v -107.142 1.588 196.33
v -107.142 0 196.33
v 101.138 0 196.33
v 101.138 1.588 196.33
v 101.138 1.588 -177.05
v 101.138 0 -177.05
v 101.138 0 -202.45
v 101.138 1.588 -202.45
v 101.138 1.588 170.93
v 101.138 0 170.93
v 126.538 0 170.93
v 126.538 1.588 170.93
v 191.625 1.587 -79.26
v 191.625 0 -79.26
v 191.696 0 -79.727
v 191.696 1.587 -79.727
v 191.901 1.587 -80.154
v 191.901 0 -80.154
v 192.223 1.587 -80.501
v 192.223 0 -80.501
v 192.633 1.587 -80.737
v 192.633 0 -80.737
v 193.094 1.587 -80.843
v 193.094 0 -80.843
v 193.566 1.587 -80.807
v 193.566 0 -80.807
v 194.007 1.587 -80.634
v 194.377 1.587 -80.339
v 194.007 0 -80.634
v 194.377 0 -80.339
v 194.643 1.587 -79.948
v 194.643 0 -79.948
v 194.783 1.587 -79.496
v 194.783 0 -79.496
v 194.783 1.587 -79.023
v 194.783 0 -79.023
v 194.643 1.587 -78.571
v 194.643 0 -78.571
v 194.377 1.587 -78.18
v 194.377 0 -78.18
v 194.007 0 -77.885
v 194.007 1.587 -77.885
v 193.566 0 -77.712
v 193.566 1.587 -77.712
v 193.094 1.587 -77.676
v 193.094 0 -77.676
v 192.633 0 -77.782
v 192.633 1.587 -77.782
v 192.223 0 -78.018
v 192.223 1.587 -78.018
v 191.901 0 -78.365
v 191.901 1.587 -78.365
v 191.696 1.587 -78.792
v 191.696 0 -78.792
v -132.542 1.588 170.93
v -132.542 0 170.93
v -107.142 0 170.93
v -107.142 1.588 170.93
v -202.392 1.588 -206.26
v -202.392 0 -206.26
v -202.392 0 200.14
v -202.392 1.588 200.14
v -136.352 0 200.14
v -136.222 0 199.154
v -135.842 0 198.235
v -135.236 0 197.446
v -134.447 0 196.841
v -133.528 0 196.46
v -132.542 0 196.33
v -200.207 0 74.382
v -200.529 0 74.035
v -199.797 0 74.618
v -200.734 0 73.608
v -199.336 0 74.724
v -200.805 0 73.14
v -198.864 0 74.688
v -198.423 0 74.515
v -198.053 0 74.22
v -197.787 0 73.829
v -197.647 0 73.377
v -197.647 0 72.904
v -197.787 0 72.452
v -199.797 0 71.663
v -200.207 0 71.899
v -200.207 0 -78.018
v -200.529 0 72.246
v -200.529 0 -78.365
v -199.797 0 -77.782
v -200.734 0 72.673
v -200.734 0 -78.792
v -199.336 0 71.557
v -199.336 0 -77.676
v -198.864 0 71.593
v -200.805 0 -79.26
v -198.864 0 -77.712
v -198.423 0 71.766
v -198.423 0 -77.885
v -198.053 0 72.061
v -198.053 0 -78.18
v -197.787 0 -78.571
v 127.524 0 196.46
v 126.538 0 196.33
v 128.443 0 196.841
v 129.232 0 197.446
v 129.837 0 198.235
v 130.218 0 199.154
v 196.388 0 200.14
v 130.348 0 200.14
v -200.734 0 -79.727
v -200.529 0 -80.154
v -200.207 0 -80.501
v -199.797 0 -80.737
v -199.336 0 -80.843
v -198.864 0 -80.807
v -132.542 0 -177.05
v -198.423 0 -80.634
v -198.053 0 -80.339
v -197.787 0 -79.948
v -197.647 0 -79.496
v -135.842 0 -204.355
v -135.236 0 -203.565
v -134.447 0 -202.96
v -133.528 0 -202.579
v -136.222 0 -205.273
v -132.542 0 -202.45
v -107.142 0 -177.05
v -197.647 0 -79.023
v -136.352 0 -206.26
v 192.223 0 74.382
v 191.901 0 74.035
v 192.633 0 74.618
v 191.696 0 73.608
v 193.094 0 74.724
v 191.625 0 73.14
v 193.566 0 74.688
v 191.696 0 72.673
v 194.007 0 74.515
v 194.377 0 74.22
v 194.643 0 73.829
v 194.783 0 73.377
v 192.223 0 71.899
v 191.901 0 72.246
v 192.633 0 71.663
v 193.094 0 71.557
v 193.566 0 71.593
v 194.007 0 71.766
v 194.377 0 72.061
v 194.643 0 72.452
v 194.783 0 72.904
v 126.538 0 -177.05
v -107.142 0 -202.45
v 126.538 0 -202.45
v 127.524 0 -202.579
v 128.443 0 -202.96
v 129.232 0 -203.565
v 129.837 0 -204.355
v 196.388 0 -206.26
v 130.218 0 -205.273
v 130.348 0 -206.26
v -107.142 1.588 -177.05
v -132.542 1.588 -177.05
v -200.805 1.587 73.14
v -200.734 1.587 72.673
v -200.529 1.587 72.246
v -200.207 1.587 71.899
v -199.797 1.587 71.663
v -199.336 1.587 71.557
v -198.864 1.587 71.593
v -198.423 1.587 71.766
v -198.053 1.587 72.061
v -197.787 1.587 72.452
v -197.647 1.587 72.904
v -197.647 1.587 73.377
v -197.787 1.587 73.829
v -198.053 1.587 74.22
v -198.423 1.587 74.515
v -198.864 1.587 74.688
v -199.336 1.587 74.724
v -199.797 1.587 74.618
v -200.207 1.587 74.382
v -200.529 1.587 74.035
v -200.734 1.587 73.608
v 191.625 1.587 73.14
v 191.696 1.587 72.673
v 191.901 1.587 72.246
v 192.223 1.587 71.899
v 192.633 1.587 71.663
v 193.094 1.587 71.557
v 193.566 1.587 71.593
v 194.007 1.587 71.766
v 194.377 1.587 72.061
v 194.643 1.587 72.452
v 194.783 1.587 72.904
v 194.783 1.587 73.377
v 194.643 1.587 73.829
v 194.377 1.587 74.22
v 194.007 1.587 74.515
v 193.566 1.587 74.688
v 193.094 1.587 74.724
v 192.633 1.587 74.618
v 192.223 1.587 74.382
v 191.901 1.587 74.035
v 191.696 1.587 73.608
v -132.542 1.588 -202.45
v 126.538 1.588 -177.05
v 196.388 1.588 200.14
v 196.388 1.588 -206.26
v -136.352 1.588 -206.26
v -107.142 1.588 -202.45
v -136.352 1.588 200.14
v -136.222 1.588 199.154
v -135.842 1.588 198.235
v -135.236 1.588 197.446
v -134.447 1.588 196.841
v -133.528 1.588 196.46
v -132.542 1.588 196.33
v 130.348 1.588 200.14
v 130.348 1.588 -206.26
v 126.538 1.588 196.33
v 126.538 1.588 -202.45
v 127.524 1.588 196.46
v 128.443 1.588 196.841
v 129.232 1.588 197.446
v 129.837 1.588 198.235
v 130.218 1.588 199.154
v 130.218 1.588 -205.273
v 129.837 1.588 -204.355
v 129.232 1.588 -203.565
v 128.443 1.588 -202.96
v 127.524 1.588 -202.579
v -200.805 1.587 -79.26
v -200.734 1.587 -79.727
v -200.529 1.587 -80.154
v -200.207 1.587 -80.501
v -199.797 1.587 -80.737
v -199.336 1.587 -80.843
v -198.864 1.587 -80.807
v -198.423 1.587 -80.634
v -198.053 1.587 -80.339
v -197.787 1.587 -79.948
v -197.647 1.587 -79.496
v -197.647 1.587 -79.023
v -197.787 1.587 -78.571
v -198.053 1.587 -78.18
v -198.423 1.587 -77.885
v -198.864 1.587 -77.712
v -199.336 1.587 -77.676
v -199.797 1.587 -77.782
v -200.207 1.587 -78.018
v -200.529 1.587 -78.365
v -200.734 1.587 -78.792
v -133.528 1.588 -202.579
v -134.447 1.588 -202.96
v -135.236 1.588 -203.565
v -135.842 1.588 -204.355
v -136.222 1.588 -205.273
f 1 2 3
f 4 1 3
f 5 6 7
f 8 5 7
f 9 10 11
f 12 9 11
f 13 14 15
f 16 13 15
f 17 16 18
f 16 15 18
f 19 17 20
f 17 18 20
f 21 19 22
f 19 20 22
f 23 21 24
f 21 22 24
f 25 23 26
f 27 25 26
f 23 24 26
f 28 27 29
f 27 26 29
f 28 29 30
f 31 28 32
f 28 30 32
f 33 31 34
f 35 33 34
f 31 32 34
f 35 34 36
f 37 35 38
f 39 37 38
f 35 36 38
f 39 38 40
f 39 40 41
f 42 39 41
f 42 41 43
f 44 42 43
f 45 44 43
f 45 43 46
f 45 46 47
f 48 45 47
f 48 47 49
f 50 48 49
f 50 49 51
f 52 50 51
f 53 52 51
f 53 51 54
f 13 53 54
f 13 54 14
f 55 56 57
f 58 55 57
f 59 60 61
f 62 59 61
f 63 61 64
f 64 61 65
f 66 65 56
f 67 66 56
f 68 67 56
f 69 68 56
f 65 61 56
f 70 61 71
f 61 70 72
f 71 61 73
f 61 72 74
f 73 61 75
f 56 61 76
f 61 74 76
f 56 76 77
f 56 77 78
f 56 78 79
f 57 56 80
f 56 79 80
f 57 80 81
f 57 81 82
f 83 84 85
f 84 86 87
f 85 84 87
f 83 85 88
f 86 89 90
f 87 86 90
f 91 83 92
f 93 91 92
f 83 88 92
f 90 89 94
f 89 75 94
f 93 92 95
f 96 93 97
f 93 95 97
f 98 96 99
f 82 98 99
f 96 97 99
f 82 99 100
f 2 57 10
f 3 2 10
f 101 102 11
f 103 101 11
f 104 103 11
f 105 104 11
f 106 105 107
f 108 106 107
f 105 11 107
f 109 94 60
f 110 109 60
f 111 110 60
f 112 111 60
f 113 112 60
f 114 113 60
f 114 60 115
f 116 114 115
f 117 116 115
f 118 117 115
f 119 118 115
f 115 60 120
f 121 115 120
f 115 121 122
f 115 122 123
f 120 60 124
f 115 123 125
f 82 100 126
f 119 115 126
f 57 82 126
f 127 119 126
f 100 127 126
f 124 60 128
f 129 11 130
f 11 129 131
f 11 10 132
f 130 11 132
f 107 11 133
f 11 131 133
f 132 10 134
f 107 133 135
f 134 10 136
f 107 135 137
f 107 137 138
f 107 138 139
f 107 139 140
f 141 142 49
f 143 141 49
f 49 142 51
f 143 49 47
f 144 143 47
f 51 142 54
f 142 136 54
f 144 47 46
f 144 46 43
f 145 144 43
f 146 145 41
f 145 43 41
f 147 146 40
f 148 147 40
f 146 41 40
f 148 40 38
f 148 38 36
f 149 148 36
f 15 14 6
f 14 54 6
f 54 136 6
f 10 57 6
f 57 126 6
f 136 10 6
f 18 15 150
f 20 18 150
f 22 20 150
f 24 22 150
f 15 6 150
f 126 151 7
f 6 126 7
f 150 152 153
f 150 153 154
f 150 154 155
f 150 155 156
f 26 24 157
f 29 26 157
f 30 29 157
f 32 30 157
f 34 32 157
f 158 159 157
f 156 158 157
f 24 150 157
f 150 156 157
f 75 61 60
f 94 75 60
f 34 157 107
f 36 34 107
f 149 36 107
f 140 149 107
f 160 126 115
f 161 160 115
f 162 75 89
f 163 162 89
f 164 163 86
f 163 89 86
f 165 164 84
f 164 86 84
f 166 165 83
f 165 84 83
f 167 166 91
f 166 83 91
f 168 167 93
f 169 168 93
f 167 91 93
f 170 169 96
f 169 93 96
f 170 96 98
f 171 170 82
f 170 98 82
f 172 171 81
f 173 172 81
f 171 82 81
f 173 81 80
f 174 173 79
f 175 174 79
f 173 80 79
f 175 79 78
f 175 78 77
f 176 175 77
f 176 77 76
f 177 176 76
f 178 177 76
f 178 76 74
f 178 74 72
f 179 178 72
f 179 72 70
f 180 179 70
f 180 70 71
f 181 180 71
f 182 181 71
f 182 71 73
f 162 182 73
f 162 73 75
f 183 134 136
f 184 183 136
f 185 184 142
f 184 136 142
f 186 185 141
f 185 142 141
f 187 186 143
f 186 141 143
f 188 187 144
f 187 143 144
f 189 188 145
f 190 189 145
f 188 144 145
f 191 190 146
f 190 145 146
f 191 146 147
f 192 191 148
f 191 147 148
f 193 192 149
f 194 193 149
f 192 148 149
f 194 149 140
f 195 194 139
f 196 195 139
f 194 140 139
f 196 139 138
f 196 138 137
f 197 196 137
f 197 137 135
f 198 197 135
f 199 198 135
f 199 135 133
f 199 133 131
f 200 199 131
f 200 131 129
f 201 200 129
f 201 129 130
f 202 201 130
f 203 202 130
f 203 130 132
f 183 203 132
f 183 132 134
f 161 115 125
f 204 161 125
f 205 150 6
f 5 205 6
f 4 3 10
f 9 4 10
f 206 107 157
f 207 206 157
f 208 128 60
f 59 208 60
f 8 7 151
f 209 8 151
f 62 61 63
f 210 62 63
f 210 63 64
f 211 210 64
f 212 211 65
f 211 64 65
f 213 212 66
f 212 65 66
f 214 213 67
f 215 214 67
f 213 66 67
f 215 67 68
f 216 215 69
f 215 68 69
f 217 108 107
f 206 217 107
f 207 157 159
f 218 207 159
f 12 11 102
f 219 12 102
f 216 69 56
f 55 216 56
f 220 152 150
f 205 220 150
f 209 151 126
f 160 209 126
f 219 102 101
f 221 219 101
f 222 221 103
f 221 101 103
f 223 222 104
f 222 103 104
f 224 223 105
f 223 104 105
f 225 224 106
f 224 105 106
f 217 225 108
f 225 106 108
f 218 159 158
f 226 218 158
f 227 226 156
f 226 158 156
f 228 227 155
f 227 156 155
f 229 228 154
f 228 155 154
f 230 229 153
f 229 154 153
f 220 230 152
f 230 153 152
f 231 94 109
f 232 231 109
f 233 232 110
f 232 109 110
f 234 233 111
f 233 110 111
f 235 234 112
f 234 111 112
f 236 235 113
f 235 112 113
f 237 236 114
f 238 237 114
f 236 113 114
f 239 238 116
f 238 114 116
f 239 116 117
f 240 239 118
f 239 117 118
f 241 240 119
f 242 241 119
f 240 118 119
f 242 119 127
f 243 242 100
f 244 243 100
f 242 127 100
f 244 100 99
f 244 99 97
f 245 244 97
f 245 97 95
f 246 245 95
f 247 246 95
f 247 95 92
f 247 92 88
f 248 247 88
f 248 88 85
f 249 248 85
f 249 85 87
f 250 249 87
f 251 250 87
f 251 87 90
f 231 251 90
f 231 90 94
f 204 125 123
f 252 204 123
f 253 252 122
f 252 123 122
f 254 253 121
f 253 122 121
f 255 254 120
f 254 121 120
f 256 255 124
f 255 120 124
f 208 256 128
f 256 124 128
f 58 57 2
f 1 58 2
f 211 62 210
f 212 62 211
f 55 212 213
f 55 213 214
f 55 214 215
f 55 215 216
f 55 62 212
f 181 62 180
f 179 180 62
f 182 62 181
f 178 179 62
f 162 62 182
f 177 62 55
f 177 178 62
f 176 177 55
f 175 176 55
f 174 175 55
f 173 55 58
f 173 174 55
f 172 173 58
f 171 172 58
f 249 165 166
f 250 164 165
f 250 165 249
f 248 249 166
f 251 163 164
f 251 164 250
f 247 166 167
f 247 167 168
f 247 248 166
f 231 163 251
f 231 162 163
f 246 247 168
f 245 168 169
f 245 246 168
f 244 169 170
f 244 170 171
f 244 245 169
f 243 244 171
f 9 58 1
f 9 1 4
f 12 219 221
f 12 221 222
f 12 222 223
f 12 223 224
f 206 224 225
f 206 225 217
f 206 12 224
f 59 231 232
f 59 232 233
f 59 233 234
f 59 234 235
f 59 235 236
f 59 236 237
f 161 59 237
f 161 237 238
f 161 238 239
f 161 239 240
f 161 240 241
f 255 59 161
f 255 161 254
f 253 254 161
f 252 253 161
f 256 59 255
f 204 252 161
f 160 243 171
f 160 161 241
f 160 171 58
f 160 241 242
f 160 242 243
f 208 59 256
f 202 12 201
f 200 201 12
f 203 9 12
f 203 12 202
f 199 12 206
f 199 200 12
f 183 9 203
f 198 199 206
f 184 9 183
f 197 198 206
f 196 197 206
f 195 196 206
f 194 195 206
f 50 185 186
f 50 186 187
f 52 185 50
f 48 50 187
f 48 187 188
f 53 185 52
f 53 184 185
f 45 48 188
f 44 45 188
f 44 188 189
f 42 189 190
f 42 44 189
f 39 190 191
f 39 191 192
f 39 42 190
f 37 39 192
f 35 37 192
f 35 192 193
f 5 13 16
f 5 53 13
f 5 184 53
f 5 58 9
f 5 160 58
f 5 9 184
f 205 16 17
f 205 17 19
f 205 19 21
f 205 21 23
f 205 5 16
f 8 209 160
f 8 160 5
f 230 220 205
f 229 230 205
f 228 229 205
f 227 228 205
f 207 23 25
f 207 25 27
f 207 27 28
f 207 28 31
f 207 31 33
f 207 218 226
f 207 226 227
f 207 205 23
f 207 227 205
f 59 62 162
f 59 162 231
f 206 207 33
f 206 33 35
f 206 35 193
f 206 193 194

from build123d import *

# Parameters (mm, degrees)
BOSS_EXTRUDE1_DEPTH          = 1.5875
F_1_8_0_125_DIAMETER_HOLE1_D = 3.175


with BuildPart() as part:
    # Sketch1 → Boss-Extrude1 (new body)
    with BuildSketch(Plane(origin=(0, 0, 0), x_dir=(1, 0, 0), z_dir=(0, 1, 0))):
        with BuildLine():
            ThreePointArc((-132.542154043, 202.449520044), (-135.236230879, 203.565443208), (-136.352154043, 206.259520044))
            Line((-136.352154043, 206.259520044), (-202.392154043, 206.259520044))
            Line((-202.392154043, 206.259520044), (-202.392154043, -200.140479956))
            Line((-202.392154043, -200.140479956), (-136.352154043, -200.140479956))
            ThreePointArc((-136.352154043, -200.140479956), (-135.236230879, -197.44640312), (-132.542154043, -196.330479956))
            Line((-132.542154043, -196.330479956), (-132.542154043, -170.930479956))
            Line((-132.542154043, -170.930479956), (-107.142154043, -170.930479956))
            Line((-107.142154043, -170.930479956), (-107.142154043, -196.330479956))
            Line((-107.142154043, -196.330479956), (101.137845957, -196.330479956))
            Line((101.137845957, -196.330479956), (101.137845957, -170.930479956))
            Line((101.137845957, -170.930479956), (126.537845957, -170.930479956))
            Line((126.537845957, -170.930479956), (126.537845957, -196.330479956))
            ThreePointArc((126.537845957, -196.330479956), (129.231922793, -197.44640312), (130.347845957, -200.140479956))
            Line((130.347845957, -200.140479956), (196.387845957, -200.140479956))
            Line((196.387845957, -200.140479956), (196.387845957, 206.259520044))
            Line((196.387845957, 206.259520044), (130.347845957, 206.259520044))
            ThreePointArc((130.347845957, 206.259520044), (129.231922793, 203.565443208), (126.537845957, 202.449520044))
            Line((126.537845957, 202.449520044), (126.537845957, 177.049520044))
            Line((126.537845957, 177.049520044), (101.137845957, 177.049520044))
            Line((101.137845957, 177.049520044), (101.137845957, 202.449520044))
            Line((101.137845957, 202.449520044), (-107.142154043, 202.449520044))
            Line((-107.142154043, 202.449520044), (-107.142154043, 177.049520044))
            Line((-107.142154043, 177.049520044), (-132.542154043, 177.049520044))
            Line((-132.542154043, 177.049520044), (-132.542154043, 202.449520044))
        make_face()
    extrude(amount=BOSS_EXTRUDE1_DEPTH)

    # 1/8 (0.125) Diameter Hole1 (through all)
    with Locations(Plane(origin=(0, 1.5875, 0), x_dir=(1, 0, 0), z_dir=(0, 1, 0))):
        with Locations((-199.217154043, 79.259520044), (-199.217154043, -73.140479956), (193.212845957, -73.140479956), (193.212845957, 79.259520044)):
            Hole(F_1_8_0_125_DIAMETER_HOLE1_D / 2)


solid = part.part
